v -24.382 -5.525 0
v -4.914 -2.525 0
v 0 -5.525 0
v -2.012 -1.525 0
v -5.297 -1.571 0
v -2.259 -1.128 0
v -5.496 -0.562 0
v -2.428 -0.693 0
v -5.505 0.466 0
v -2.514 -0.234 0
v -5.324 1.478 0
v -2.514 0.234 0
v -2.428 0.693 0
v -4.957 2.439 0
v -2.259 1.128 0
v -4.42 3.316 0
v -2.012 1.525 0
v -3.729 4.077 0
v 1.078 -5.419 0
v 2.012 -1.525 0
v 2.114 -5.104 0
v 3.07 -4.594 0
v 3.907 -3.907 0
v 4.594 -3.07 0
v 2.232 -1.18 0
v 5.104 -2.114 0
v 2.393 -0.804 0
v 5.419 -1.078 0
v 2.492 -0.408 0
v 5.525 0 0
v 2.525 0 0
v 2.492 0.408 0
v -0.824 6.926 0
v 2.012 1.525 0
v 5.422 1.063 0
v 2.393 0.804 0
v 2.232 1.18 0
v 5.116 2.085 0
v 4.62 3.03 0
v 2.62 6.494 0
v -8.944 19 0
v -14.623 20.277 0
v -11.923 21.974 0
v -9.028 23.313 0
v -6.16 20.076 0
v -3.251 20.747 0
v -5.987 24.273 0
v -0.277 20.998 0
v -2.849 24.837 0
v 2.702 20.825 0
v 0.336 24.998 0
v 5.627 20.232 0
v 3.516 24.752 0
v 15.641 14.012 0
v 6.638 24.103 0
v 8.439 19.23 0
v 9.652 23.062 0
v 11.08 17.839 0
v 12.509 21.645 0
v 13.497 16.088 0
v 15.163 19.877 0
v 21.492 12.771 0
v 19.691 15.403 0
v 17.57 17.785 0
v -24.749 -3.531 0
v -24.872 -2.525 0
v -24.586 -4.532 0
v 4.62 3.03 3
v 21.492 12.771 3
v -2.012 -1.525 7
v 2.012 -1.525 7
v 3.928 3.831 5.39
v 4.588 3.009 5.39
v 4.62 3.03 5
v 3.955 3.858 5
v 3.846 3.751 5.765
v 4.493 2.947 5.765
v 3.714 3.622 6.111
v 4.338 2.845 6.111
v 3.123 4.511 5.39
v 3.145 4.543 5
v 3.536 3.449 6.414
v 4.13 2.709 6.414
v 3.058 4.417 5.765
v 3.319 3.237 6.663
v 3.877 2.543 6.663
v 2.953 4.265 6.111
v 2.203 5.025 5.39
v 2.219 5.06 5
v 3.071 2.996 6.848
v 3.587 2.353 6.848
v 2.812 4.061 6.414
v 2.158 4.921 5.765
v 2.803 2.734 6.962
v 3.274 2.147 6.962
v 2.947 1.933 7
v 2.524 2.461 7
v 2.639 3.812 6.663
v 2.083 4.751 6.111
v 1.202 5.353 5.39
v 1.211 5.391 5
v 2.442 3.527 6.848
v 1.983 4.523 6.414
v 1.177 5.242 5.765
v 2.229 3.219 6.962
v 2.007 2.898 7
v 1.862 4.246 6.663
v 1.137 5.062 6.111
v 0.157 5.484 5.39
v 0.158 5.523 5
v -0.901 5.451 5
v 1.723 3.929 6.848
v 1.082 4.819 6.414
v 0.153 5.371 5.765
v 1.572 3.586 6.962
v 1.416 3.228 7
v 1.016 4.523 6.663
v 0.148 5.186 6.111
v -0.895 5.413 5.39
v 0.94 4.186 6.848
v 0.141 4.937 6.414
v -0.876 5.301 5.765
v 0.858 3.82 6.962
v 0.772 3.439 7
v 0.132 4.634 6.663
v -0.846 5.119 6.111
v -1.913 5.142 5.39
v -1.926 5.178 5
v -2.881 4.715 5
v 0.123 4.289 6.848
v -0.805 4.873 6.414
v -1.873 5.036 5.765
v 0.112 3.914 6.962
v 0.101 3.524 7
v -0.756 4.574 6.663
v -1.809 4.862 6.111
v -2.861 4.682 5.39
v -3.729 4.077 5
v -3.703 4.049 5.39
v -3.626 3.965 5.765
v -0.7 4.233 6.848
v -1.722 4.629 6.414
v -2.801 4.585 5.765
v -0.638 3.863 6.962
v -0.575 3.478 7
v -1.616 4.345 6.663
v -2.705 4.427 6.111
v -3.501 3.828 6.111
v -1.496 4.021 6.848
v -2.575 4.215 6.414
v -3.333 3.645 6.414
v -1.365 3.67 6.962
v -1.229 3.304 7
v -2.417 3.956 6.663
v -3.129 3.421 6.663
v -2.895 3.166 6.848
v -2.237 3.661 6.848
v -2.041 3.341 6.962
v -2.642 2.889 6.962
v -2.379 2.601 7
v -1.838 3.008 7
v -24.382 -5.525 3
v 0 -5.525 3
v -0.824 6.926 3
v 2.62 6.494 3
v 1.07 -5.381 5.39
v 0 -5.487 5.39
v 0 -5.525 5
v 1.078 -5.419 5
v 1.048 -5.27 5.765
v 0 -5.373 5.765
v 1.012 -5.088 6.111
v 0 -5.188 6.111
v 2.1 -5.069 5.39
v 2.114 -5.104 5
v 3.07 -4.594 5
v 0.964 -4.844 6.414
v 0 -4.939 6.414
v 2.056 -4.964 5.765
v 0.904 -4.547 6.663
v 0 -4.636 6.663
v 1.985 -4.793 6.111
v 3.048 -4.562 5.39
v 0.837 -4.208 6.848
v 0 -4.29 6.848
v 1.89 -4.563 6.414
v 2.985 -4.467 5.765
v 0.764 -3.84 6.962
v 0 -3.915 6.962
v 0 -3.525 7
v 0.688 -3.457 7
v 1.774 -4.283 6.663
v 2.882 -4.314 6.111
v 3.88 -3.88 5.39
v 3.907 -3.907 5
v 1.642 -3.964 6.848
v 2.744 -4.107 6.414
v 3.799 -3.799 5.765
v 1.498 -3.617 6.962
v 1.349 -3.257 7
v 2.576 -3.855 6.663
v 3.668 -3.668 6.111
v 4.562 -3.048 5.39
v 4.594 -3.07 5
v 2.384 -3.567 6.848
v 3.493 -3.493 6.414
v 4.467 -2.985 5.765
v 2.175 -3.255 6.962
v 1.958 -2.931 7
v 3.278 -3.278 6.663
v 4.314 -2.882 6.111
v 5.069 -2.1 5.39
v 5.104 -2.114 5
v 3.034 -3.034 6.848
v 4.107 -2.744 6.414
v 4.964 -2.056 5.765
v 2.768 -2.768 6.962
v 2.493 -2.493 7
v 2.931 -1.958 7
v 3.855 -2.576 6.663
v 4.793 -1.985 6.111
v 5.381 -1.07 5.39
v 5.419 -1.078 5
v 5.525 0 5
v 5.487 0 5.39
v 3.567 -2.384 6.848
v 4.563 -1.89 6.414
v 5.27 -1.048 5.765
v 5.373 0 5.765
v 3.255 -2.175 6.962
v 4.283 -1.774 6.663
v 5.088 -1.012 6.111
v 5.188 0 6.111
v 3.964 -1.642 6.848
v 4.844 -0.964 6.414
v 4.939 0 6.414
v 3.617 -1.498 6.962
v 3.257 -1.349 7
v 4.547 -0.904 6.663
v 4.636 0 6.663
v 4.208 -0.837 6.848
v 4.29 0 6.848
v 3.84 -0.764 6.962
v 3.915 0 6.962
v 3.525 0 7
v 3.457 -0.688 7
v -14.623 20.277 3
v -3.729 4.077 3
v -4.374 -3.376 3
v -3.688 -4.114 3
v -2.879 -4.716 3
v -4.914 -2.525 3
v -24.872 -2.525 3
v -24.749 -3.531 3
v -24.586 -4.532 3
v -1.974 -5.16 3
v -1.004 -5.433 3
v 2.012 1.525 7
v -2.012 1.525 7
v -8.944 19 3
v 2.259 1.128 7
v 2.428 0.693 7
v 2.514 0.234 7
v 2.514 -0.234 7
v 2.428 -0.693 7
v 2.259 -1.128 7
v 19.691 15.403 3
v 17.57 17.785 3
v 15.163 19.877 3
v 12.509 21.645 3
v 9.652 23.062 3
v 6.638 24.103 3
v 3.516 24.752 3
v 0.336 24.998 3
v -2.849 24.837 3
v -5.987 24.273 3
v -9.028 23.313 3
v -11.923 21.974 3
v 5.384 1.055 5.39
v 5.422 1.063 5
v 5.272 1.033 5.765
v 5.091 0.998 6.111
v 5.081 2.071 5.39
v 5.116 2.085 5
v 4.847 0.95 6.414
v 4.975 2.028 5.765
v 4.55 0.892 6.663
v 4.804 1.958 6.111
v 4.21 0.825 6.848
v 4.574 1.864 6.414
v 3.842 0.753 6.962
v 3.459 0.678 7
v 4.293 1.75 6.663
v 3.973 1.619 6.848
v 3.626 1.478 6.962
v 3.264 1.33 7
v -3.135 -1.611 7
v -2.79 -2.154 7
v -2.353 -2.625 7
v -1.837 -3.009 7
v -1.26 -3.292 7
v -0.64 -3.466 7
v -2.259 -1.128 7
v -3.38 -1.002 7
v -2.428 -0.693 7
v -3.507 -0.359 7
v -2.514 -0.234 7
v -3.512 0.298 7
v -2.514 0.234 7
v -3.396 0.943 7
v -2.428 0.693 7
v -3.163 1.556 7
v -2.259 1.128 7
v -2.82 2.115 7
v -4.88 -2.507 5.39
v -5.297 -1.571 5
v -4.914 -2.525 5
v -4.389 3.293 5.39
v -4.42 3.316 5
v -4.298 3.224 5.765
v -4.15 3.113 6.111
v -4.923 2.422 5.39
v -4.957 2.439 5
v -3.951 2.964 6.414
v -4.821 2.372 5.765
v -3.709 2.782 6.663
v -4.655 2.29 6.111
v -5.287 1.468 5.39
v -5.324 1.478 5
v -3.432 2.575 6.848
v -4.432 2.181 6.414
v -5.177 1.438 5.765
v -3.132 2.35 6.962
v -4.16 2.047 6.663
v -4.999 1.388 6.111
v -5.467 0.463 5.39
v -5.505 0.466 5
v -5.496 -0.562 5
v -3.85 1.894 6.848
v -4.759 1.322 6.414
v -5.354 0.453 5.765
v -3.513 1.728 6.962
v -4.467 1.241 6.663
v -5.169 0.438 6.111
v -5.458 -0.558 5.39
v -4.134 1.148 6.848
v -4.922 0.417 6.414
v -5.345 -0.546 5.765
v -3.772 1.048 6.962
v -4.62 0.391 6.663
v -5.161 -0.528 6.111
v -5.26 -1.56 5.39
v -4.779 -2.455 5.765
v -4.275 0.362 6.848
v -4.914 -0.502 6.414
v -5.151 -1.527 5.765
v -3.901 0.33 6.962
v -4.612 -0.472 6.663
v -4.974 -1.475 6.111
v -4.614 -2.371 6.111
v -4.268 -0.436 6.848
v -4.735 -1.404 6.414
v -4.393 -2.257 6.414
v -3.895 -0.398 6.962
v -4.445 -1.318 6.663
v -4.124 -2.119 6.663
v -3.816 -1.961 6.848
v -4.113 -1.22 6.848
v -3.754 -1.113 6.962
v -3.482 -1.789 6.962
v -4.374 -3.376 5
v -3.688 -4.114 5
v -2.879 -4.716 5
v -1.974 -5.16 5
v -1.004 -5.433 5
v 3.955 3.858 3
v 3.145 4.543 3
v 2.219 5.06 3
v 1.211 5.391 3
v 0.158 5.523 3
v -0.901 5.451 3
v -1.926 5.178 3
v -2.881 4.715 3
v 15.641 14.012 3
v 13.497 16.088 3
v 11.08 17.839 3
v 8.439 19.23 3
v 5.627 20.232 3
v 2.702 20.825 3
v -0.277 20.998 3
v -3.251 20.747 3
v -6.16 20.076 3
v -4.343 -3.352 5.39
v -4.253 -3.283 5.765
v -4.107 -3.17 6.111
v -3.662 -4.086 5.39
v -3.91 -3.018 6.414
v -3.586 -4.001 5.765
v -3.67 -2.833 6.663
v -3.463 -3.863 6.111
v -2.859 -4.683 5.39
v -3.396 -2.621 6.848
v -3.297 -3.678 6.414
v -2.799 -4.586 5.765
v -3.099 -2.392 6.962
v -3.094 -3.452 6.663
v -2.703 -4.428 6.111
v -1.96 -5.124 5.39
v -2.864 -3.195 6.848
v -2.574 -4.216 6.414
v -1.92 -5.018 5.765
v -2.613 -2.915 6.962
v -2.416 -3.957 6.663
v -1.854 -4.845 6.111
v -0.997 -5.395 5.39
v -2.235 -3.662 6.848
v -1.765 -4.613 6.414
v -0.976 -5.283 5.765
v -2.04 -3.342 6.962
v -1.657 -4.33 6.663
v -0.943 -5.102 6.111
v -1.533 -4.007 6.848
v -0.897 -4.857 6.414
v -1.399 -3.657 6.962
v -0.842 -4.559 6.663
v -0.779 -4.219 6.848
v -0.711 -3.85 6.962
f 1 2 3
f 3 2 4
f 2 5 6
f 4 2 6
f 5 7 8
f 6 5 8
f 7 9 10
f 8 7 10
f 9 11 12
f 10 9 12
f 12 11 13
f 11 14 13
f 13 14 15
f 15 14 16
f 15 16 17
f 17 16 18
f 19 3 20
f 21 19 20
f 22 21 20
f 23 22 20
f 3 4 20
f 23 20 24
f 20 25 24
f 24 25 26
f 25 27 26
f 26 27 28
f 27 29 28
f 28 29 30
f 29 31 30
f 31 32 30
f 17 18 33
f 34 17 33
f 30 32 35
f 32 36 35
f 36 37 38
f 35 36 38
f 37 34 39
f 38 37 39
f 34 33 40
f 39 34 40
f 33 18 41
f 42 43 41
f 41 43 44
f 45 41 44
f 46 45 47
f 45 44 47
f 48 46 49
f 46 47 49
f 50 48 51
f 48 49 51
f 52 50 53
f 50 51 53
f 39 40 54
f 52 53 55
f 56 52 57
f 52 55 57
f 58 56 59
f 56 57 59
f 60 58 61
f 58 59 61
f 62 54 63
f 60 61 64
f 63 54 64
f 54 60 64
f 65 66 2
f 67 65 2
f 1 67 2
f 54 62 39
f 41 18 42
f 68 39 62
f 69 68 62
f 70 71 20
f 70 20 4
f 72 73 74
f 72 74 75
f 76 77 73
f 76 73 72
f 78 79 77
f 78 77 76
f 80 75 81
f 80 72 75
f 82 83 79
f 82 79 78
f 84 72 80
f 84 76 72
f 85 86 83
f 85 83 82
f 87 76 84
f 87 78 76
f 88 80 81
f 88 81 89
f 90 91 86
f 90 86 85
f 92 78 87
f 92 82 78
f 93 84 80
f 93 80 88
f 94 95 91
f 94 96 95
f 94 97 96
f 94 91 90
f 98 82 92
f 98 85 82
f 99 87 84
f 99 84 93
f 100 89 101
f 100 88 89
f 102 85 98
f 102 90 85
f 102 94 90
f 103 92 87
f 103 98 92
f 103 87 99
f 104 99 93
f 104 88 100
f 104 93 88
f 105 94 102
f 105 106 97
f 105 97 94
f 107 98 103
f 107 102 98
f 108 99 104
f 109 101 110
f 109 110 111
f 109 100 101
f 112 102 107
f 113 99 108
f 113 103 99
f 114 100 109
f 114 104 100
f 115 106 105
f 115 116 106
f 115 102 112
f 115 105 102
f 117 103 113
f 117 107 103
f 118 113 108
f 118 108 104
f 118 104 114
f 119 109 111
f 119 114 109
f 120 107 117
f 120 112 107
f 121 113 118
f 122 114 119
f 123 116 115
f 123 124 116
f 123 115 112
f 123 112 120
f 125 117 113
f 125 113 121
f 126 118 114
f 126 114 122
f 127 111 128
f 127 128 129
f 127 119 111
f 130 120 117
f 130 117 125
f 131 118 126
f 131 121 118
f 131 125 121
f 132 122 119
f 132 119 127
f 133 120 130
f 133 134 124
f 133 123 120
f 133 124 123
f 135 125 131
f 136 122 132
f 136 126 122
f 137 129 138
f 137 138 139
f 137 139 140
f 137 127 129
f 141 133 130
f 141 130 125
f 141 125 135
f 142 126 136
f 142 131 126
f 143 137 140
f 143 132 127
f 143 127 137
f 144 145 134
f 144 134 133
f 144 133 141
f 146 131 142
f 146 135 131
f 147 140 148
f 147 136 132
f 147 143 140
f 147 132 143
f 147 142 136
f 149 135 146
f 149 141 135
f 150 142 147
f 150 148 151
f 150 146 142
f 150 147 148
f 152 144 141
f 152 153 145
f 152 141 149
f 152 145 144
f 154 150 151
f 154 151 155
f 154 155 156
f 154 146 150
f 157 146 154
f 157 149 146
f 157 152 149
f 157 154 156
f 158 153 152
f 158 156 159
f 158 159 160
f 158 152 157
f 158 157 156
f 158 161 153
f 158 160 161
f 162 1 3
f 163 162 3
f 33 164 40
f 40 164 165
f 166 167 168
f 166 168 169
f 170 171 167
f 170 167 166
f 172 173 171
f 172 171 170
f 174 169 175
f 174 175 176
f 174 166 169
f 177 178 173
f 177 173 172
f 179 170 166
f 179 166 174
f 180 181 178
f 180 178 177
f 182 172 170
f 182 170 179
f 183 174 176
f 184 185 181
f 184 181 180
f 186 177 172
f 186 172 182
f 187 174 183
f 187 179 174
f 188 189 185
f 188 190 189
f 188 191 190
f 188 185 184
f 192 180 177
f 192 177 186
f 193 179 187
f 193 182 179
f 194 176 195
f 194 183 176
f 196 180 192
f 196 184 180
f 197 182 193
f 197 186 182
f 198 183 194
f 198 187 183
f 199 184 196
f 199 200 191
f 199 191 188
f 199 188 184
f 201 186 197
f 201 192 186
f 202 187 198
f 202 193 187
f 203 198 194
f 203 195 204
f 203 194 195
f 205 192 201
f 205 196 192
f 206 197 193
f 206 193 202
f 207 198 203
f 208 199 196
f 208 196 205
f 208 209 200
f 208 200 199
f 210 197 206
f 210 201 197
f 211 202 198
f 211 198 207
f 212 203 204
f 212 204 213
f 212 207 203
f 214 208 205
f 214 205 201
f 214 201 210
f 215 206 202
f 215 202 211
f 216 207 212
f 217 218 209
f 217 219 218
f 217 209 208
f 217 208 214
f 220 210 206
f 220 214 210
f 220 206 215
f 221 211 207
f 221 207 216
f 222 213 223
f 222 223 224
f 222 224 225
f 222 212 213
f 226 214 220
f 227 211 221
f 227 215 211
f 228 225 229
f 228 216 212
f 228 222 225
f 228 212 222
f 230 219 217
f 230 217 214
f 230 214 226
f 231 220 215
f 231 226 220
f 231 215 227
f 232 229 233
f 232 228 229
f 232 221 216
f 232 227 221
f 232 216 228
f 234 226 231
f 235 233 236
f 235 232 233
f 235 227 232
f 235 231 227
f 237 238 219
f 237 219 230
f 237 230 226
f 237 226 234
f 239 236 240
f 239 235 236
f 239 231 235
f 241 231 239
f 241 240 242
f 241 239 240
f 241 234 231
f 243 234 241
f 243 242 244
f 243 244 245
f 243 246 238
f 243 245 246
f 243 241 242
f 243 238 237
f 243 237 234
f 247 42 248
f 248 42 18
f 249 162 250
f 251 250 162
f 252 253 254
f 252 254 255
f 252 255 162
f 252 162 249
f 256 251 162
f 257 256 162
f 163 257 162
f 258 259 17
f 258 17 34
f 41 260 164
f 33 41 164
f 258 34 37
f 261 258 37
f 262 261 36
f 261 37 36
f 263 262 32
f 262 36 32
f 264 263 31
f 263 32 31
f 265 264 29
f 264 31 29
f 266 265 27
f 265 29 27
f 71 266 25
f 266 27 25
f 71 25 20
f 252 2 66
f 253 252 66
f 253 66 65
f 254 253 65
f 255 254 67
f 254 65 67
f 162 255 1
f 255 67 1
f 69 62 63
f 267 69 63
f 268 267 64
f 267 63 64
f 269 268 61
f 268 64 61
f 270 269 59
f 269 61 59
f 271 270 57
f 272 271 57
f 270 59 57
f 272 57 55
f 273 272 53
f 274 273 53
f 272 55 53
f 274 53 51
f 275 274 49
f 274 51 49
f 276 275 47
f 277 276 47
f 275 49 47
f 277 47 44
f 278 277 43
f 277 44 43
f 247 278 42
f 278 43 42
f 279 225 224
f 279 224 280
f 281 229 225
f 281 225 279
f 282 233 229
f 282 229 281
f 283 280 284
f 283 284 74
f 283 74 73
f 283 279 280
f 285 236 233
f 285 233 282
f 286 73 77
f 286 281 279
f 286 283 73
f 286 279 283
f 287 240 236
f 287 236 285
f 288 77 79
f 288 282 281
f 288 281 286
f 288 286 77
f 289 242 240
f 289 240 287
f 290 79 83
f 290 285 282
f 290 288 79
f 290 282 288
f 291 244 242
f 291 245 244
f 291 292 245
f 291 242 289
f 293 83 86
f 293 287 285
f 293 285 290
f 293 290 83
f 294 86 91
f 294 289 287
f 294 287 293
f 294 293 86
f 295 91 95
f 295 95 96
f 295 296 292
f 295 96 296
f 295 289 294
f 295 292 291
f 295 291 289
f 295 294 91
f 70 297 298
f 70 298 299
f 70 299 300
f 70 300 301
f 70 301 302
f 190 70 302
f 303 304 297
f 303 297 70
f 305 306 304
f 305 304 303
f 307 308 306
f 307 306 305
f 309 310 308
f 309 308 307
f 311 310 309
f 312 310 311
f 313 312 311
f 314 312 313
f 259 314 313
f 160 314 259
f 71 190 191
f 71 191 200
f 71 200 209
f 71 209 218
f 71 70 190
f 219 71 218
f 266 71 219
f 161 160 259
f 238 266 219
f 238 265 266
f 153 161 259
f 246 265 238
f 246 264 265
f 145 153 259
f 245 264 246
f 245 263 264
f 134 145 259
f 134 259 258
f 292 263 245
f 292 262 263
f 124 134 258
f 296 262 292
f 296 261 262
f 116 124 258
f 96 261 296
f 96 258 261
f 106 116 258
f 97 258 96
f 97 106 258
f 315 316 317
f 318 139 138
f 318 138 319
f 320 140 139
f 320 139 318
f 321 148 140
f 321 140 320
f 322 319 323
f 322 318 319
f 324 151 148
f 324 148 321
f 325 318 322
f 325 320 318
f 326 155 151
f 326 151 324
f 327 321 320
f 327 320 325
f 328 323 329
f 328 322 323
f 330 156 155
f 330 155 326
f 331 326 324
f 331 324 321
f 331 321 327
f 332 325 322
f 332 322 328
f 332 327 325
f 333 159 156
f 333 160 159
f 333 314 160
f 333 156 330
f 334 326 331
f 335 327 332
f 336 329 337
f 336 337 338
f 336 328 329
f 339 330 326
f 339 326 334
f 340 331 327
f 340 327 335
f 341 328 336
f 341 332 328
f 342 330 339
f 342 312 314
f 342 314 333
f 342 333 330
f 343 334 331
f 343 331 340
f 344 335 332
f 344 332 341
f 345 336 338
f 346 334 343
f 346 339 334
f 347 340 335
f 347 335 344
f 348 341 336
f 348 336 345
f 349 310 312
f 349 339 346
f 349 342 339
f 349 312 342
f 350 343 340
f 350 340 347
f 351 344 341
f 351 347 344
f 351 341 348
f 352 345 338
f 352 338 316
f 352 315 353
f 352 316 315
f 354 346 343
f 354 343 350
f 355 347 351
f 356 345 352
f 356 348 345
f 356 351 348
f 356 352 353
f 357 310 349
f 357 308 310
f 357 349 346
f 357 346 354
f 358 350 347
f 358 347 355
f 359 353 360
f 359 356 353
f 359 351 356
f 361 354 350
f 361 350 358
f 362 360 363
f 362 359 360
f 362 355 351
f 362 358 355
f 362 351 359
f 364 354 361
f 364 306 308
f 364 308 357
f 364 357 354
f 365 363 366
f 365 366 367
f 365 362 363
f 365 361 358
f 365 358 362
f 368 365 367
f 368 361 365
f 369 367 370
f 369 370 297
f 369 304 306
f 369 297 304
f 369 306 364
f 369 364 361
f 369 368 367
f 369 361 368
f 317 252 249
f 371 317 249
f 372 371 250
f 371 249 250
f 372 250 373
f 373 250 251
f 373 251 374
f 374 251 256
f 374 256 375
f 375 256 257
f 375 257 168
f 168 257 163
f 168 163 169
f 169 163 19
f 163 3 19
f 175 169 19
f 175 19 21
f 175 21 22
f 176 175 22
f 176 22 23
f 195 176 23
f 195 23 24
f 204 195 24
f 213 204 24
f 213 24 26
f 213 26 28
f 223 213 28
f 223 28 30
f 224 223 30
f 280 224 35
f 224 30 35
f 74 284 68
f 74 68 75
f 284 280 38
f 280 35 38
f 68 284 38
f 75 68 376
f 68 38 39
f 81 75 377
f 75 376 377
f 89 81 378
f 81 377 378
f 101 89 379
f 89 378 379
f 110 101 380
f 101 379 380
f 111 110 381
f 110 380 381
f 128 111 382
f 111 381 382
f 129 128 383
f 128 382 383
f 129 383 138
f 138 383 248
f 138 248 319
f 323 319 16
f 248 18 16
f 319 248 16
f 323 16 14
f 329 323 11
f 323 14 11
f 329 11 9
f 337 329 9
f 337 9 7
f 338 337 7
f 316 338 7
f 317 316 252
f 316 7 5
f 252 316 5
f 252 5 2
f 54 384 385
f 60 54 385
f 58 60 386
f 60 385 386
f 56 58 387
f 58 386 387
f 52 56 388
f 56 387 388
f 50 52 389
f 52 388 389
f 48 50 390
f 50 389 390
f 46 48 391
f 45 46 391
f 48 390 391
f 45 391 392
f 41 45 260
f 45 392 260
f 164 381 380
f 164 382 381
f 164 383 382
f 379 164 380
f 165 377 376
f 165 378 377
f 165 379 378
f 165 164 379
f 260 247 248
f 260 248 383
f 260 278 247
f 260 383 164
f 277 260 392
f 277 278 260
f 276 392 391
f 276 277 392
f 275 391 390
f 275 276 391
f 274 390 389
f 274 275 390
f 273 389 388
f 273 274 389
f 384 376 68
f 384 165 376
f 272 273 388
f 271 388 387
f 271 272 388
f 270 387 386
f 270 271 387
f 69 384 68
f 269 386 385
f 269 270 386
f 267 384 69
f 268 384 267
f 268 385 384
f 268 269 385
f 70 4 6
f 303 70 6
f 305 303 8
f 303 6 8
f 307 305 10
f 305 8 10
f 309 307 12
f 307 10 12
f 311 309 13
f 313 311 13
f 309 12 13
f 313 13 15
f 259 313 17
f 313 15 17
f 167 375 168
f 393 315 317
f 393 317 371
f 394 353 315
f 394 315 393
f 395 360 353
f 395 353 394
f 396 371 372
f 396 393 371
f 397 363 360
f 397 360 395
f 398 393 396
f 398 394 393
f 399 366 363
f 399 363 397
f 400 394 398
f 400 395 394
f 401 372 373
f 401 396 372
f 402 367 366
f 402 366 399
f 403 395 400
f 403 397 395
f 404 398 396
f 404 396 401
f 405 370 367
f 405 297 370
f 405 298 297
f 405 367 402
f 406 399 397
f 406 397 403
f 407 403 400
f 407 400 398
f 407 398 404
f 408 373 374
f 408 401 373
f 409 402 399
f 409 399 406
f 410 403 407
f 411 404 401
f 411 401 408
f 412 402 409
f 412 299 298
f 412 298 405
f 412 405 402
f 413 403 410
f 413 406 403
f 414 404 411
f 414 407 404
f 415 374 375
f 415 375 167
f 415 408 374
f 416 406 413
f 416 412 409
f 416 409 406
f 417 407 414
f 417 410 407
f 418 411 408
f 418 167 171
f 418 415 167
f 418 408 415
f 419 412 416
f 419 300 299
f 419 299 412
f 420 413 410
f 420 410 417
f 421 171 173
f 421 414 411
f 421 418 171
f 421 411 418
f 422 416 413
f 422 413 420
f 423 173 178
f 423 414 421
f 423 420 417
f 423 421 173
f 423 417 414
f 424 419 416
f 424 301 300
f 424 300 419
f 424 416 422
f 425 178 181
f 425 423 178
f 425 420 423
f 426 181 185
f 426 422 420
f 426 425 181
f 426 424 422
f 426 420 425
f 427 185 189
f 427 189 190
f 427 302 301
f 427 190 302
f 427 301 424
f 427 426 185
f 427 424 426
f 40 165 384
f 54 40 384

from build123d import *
from build123d.topology import SkipClean

# Parameters (mm, degrees)
BOSS_EXTRUDE2_DEPTH = 3
CUT_EXTRUDE1_DEPTH  = 3
BOSS_EXTRUDE3_DEPTH = 4
FILLET1_R           = 2


with BuildPart() as part:
    # Sketch1 → Boss-Extrude2 (new body)
    with BuildSketch(Plane.XY):
        with BuildLine():
            ThreePointArc((0, -5.525), (-2.878801834, -4.715731651), (-4.91426495, -2.525))
            Line((-4.91426495, -2.525), (-24.872160642, -2.525))
            ThreePointArc((-24.872160642, -2.525), (-24.672642191, -4.032459214), (-24.381845193, -5.525))
            Line((-24.381845193, -5.525), (0, -5.525))
        make_face()
        with BuildLine():
            ThreePointArc((0, -2.525), (1.123610253, -2.261222015), (2.01246118, -1.525))
            Line((2.01246118, -1.525), (-2.01246118, -1.525))
            ThreePointArc((-2.01246118, -1.525), (-1.123610253, -2.261222015), (0, -2.525))
        make_face()
        with BuildLine():
            ThreePointArc((2.01246118, 1.525), (0, 2.525), (-2.01246118, 1.525))
            Line((-2.01246118, 1.525), (2.01246118, 1.525))
        make_face()
        with BuildLine():
            Line((-3.728656931, 4.077099765), (-2.01246118, 1.525))
            ThreePointArc((-2.01246118, 1.525), (0, 2.525), (2.01246118, 1.525))
            Line((2.01246118, 1.525), (4.61980513, 3.030350732))
            ThreePointArc((4.61980513, 3.030350732), (0.687355194, 5.482076964), (-3.728656931, 4.077099765))
        make_face()
        with BuildLine():
            ThreePointArc((0, -2.525), (-1.123610253, -2.261222015), (-2.01246118, -1.525))
            ThreePointArc((-2.01246118, -1.525), (-2.525, 0), (-2.01246118, 1.525))
            Line((-2.01246118, 1.525), (-3.728656931, 4.077099765))
            ThreePointArc((-3.728656931, 4.077099765), (-5.438010205, 0.976560297), (-4.91426495, -2.525))
            Line((-4.91426495, -2.525), (0, -2.525))
        make_face()
        with BuildLine():
            Line((0, -5.525), (0, -2.525))
            Line((0, -2.525), (-4.91426495, -2.525))
            ThreePointArc((-4.91426495, -2.525), (-2.878801834, -4.715731651), (0, -5.525))
        make_face()
        with BuildLine():
            ThreePointArc((2.525, 0), (2.39343785, -0.804412991), (2.01246118, -1.525))
            ThreePointArc((2.01246118, -1.525), (1.123610253, -2.261222015), (0, -2.525))
            Line((0, -2.525), (0, -5.525))
            ThreePointArc((0, -5.525), (3.906764966, -3.906764966), (5.525, 0))
            Line((5.525, 0), (2.525, 0))
        make_face()
        with BuildLine():
            ThreePointArc((2.01246118, 1.525), (2.39343785, 0.804412991), (2.525, 0))
            Line((2.525, 0), (5.525, 0))
            ThreePointArc((5.525, 0), (5.293866656, 1.581328817), (4.61980513, 3.030350732))
            Line((4.61980513, 3.030350732), (2.01246118, 1.525))
        make_face()
        with BuildLine():
            Line((-14.622794466, 20.277422963), (-3.728656931, 4.077099765))
            ThreePointArc((-3.728656931, 4.077099765), (0.687355194, 5.482076964), (4.61980513, 3.030350732))
            Line((4.61980513, 3.030350732), (21.491693232, 12.771339869))
            ThreePointArc((21.491693232, 12.771339869), (5.087313969, 24.476912317), (-14.622794466, 20.277422963))
        make_face()
    extrude(amount=BOSS_EXTRUDE2_DEPTH)

    # Sketch2 → Cut-Extrude1 (cut)
    with BuildSketch(Plane.XY.offset(3)):
        with BuildLine():
            Line((-8.943662301, 19.000286962), (-0.824328522, 6.926285605))
            Line((-0.824328522, 6.926285605), (2.61980513, 6.494452347))
            Line((2.61980513, 6.494452347), (15.641340759, 14.012439447))
            ThreePointArc((15.641340759, 14.012439447), (4.175449663, 20.580709903), (-8.943662301, 19.000286962))
        make_face()
    extrude(amount=-CUT_EXTRUDE1_DEPTH, mode=Mode.SUBTRACT)

    # Sketch3 → Boss-Extrude3 (add)
    with SkipClean():  # the faces are left unmerged after this step: merging them gives an invalid solid
        with BuildSketch(Plane.XY.offset(3)):
            with BuildLine():
                ThreePointArc((5.525, 0), (5.293866656, 1.581328817), (4.61980513, 3.030350732))
                ThreePointArc((4.61980513, 3.030350732), (0.687355194, 5.482076964), (-3.728656931, 4.077099765))
                ThreePointArc((-3.728656931, 4.077099765), (-5.438010205, 0.976560297), (-4.91426495, -2.525))
                ThreePointArc((-4.91426495, -2.525), (-2.878801834, -4.715731651), (0, -5.525))
                ThreePointArc((0, -5.525), (3.906764966, -3.906764966), (5.525, 0))
            make_face()
            with BuildLine():
                Line((-2.01246118, 1.525), (2.01246118, 1.525))
                ThreePointArc((2.01246118, 1.525), (2.525, 0), (2.01246118, -1.525))
                Line((2.01246118, -1.525), (-2.01246118, -1.525))
                ThreePointArc((-2.01246118, -1.525), (-2.525, 0), (-2.01246118, 1.525))
            make_face(mode=Mode.SUBTRACT)
        extrude(amount=BOSS_EXTRUDE3_DEPTH)

    # Fillet1
    fillet1_edges = [part.edges().sort_by_distance(p)[0] for p in [
        (3.728656931, -4.077099765, 7),
    ]]
    fillet(fillet1_edges, radius=FILLET1_R)


solid = part.part
